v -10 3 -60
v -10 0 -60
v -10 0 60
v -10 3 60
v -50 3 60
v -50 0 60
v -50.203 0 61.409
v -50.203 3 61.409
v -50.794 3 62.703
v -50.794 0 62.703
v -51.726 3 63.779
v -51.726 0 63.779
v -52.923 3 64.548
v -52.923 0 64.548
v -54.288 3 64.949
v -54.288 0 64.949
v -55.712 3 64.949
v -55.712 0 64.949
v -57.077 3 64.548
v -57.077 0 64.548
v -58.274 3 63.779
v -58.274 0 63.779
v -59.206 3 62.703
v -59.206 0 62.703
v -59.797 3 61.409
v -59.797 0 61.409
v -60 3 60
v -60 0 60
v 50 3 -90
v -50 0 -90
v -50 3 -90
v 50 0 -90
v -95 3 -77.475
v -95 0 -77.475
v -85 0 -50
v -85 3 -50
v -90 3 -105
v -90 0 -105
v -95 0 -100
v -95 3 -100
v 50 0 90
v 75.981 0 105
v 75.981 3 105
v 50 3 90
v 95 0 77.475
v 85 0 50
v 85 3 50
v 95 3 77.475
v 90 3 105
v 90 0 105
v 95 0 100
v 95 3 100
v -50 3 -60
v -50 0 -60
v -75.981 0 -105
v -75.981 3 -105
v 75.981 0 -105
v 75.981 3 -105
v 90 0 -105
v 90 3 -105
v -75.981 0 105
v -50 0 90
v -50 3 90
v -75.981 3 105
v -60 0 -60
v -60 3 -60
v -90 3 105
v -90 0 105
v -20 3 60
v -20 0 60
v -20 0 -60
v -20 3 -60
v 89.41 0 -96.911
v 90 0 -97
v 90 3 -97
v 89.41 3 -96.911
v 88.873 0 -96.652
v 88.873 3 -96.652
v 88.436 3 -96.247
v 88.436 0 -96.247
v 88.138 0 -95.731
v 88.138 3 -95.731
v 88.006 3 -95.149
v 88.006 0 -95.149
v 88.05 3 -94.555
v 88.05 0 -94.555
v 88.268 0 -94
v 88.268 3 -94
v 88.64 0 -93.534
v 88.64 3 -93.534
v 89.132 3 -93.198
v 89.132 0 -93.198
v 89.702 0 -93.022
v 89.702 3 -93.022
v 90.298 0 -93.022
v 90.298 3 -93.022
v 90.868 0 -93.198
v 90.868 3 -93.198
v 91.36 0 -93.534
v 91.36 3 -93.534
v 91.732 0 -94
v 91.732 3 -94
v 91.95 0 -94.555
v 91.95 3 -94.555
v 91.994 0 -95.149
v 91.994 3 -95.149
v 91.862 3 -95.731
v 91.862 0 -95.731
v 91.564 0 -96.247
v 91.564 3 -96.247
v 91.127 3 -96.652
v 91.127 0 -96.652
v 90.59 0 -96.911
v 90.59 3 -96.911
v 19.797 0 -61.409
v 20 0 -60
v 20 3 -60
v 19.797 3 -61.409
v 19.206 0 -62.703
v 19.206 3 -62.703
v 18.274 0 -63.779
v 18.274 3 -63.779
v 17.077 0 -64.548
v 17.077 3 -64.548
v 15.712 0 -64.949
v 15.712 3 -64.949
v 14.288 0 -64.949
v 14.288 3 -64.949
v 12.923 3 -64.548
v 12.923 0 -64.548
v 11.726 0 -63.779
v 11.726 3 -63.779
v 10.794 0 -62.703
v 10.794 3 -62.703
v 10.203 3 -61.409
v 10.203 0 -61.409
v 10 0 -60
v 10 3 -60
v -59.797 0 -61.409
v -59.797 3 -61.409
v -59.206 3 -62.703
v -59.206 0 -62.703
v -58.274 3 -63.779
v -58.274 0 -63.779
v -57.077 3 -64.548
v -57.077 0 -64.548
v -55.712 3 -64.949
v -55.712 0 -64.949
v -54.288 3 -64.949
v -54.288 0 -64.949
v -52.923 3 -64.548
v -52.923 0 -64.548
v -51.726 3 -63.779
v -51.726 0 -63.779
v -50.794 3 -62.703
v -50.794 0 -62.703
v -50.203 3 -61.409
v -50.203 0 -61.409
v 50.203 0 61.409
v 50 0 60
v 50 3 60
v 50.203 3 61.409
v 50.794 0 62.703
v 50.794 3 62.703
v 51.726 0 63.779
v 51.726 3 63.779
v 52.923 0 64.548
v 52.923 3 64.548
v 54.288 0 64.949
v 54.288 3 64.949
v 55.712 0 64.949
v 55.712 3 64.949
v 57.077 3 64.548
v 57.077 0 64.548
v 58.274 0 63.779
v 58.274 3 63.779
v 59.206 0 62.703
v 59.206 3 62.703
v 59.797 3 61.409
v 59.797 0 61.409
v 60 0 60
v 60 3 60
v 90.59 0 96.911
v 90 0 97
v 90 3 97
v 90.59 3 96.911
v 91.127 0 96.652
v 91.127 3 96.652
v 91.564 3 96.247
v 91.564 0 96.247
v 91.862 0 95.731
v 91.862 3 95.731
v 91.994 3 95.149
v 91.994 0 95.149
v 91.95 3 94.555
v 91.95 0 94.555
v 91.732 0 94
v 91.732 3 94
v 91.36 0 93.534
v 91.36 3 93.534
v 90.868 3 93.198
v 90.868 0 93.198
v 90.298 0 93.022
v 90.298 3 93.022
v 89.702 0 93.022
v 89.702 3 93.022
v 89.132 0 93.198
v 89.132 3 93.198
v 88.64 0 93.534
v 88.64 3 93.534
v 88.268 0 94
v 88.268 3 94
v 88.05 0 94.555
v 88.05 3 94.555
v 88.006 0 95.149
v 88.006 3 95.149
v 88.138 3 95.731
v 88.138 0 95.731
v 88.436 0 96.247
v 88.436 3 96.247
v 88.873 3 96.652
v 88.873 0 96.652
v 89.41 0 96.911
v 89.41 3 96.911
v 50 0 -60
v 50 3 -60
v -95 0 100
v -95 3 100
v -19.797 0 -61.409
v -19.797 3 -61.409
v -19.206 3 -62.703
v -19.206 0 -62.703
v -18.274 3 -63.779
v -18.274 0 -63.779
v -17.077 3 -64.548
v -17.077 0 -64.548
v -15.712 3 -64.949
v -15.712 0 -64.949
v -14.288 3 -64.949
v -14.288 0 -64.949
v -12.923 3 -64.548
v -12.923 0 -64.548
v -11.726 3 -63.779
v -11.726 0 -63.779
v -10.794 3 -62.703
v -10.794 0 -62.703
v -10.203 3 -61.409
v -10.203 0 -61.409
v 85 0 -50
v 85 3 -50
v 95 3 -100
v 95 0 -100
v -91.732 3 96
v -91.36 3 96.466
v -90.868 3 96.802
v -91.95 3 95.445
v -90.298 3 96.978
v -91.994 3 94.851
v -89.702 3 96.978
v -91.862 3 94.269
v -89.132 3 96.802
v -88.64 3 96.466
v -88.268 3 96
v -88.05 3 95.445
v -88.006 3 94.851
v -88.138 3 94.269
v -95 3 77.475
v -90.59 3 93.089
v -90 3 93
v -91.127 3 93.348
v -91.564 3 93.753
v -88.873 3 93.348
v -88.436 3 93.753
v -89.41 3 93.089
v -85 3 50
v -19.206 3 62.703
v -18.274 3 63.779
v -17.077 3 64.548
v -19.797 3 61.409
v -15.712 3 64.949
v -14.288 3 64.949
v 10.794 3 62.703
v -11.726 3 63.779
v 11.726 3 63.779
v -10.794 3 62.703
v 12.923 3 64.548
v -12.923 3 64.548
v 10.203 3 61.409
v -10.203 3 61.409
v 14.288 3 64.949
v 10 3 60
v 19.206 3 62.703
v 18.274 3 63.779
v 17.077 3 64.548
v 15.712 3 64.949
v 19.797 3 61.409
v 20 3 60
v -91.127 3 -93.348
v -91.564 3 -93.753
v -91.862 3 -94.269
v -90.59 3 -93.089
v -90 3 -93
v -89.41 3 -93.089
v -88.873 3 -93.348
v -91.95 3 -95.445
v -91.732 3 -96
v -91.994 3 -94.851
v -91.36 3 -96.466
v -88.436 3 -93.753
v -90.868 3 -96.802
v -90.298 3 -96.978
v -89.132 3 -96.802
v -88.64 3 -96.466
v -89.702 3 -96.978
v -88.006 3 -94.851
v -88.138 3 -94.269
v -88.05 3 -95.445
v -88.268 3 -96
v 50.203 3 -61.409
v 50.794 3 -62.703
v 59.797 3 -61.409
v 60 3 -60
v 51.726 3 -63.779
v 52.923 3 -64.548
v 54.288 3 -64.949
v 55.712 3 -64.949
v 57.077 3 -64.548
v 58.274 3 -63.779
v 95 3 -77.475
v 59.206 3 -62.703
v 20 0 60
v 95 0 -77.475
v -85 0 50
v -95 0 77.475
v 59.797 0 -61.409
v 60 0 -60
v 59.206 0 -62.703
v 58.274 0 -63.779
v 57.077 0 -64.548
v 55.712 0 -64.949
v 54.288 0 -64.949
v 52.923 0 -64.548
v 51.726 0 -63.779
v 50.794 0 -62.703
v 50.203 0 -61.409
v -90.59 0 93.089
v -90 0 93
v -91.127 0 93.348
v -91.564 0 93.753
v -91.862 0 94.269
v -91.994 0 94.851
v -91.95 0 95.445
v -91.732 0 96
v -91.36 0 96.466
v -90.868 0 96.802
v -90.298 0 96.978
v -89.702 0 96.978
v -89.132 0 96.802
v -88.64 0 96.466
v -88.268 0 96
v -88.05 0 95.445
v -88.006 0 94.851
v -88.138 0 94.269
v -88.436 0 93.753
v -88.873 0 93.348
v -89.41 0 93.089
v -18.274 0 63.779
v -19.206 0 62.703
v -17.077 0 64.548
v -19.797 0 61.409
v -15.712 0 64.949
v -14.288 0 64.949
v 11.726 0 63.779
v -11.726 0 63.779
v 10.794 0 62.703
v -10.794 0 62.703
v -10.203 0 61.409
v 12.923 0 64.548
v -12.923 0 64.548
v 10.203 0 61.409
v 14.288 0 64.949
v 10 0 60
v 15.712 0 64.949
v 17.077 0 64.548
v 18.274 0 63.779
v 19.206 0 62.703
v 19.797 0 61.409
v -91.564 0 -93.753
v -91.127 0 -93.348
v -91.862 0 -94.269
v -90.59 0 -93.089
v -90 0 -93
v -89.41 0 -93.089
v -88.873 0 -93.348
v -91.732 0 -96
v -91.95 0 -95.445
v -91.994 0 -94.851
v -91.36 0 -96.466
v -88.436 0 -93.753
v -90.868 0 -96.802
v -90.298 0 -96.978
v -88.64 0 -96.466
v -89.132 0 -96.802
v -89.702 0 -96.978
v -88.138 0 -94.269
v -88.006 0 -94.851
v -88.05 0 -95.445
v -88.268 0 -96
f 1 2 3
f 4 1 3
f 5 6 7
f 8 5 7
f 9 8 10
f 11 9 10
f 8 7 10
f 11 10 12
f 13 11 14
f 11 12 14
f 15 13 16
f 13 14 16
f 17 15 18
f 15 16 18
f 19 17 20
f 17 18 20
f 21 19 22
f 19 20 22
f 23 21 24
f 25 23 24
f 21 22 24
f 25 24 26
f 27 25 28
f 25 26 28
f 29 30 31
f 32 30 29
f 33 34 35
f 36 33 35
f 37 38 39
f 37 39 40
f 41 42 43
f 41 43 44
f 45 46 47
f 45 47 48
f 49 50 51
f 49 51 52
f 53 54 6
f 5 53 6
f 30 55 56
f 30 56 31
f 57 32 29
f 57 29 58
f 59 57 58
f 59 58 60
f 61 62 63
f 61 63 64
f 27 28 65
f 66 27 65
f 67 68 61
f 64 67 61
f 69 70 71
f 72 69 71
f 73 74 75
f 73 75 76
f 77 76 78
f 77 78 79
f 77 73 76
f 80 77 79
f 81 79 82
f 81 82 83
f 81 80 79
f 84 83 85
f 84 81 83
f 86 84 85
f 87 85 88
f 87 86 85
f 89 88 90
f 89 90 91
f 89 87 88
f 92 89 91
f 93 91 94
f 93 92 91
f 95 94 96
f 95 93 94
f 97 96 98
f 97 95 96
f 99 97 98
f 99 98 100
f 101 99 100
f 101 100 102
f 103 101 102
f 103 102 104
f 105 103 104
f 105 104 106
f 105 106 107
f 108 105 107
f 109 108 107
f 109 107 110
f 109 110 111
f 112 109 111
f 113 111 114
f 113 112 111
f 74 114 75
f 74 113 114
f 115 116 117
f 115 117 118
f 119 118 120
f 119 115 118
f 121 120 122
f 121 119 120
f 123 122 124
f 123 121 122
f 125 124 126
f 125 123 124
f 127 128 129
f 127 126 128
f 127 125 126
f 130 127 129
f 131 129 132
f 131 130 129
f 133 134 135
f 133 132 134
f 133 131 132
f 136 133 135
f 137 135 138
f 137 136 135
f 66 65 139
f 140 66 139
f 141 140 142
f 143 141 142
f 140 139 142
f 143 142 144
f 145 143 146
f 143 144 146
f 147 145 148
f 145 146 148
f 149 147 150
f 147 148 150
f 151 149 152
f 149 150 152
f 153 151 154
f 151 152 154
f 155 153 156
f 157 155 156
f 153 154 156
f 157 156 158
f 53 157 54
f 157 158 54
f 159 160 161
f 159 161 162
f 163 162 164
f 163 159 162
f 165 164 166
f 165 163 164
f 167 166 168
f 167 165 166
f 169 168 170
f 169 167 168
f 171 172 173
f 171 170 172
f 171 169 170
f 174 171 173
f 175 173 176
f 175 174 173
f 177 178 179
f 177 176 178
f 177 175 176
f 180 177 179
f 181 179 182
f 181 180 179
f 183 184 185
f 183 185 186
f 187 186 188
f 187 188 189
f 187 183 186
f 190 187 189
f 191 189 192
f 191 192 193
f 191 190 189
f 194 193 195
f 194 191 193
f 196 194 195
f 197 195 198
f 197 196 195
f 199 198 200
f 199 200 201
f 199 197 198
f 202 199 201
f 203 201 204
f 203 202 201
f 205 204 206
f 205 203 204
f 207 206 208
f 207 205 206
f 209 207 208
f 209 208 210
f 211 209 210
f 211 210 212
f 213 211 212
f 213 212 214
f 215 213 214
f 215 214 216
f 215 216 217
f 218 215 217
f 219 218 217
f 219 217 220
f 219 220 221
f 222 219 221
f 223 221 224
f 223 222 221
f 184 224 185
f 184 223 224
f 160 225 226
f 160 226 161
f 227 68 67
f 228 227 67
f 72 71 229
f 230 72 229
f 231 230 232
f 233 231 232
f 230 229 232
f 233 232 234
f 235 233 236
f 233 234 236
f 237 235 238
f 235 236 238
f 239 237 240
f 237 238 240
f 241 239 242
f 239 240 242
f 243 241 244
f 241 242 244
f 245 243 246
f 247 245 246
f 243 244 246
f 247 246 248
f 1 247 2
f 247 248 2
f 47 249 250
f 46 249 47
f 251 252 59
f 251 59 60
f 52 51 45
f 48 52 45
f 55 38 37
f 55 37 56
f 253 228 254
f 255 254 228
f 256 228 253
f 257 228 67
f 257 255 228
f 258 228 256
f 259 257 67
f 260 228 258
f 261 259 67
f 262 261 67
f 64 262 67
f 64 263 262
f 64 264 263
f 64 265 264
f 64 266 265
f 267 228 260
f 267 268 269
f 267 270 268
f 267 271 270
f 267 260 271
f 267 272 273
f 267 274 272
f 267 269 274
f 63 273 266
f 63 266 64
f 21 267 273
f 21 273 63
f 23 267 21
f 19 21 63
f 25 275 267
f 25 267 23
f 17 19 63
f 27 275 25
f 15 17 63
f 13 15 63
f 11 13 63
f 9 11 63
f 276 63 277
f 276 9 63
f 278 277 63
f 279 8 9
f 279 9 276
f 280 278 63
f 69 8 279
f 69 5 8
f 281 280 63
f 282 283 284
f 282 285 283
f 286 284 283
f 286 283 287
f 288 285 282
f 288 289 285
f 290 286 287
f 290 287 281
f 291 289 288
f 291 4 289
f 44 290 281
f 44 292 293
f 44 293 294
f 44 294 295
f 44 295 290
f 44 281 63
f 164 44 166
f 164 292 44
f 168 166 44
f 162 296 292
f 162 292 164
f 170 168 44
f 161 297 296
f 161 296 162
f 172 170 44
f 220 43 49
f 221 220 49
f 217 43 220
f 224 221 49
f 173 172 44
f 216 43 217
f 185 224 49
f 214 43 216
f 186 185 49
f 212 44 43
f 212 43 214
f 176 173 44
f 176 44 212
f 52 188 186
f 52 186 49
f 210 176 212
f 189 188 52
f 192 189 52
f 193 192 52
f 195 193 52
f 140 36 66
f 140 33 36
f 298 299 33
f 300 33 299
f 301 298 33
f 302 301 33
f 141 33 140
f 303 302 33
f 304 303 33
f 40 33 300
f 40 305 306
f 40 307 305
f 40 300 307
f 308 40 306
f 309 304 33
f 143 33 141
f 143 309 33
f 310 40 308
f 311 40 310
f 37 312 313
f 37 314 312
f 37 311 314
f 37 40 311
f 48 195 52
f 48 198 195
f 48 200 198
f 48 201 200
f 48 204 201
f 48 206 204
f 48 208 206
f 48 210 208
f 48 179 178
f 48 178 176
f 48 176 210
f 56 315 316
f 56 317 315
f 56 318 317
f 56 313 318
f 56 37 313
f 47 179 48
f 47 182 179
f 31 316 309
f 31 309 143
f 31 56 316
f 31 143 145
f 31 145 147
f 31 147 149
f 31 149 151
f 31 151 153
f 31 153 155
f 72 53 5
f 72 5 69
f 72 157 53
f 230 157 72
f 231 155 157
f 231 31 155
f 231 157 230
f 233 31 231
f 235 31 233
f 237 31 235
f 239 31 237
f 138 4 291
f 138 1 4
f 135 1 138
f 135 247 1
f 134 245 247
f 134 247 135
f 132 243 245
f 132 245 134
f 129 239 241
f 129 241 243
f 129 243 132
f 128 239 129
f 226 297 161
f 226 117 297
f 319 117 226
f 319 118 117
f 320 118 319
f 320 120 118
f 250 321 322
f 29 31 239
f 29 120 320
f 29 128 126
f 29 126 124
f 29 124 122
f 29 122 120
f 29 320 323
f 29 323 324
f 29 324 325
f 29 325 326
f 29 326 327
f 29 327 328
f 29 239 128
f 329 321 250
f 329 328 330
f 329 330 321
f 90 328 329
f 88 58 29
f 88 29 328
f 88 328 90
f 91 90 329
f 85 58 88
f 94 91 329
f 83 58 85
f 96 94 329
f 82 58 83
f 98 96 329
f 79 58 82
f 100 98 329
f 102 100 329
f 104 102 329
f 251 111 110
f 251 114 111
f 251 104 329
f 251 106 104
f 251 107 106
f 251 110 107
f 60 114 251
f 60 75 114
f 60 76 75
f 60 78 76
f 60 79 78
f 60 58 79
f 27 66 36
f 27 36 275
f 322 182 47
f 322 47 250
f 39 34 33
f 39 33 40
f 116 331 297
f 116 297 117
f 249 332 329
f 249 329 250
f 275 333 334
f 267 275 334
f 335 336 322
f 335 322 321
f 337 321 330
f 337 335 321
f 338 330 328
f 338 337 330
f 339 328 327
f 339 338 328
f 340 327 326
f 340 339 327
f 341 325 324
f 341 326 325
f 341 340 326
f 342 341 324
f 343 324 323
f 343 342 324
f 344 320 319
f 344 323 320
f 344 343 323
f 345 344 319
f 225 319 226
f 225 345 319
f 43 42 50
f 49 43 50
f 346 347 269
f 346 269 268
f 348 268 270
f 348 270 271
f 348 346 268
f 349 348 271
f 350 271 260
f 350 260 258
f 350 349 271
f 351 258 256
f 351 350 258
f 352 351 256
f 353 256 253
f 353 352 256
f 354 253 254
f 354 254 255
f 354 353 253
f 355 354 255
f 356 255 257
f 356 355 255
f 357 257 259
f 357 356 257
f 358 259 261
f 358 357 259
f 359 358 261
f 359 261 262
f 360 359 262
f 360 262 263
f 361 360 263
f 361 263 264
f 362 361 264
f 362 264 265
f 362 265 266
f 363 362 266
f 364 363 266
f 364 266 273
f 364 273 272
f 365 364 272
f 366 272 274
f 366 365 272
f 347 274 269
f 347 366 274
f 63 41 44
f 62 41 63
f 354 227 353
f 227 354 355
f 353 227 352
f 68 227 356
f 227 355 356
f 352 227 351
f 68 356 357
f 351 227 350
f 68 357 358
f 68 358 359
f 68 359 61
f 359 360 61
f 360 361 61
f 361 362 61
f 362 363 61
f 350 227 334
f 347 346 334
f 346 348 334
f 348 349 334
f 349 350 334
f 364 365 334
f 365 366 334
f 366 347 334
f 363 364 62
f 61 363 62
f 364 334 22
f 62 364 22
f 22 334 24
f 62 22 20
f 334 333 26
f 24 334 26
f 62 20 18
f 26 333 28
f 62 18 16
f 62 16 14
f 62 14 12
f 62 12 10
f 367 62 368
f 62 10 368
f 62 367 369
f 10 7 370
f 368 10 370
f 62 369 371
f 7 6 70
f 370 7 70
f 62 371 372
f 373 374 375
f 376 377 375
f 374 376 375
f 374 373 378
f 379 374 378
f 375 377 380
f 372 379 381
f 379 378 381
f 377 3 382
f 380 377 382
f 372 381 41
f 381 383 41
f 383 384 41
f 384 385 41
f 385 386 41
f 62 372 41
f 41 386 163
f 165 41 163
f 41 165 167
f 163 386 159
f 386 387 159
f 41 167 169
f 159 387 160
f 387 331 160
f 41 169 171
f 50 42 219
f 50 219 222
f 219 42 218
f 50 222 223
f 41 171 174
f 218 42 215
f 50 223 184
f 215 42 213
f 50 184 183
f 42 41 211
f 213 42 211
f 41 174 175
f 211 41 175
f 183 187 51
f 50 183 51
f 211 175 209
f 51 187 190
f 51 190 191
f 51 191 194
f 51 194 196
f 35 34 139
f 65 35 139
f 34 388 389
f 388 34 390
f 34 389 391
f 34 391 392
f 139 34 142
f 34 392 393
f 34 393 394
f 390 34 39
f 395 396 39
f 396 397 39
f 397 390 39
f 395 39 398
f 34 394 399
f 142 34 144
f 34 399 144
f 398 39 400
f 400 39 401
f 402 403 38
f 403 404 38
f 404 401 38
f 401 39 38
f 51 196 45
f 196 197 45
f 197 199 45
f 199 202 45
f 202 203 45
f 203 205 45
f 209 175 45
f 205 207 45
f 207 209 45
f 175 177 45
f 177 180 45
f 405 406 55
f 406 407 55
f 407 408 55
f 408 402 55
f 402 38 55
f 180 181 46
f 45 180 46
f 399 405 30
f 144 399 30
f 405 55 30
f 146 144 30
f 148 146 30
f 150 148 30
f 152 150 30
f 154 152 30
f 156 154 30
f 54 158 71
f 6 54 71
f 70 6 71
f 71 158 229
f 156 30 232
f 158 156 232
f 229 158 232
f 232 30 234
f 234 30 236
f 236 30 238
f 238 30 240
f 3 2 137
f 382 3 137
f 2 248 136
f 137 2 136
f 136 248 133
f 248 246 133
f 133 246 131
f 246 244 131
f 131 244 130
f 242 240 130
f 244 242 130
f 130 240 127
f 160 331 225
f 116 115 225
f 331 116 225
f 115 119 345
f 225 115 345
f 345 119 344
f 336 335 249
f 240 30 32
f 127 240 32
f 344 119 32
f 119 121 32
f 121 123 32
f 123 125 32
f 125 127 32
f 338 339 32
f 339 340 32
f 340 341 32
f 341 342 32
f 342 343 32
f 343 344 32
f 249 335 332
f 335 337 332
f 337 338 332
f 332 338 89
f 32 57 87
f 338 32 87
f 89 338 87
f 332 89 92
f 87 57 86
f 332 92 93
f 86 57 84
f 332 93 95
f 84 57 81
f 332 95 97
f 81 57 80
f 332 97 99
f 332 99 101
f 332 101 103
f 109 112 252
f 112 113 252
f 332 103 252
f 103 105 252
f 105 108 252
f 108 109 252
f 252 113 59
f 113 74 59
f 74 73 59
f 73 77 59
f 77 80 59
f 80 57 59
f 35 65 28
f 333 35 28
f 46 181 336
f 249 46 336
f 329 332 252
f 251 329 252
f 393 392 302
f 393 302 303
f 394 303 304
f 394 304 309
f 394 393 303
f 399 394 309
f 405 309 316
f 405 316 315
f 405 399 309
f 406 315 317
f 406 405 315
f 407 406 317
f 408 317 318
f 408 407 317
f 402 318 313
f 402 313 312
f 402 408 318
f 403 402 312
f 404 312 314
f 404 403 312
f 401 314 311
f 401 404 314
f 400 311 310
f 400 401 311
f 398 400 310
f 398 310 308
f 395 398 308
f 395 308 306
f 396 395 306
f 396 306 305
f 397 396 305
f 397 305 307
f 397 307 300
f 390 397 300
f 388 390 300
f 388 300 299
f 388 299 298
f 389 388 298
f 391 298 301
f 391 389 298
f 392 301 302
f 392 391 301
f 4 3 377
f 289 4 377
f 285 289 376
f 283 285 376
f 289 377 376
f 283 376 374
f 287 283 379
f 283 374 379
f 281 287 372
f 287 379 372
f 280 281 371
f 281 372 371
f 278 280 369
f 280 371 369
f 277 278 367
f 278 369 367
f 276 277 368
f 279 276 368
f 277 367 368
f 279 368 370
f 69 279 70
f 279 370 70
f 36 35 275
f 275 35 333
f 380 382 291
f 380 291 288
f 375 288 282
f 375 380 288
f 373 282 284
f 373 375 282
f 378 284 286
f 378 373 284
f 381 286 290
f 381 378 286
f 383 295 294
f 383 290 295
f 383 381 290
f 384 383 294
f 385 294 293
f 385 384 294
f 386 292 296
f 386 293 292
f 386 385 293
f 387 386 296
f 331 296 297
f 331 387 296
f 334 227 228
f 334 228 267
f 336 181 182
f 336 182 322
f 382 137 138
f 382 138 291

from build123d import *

# Parameters (mm, degrees)
SKETCH_2_W          = 190
SKETCH_2_H          = 210
SKETCH_2_R          = 2
EXTRUDE_1_DEPTH     = 3
CUT_EXTRUDE_1_DEPTH = 142.629799124
CHAMFER_1_SIZE      = 5


with BuildPart() as part:
    # 草图2 → 凸台-拉伸1 (new body)
    with BuildSketch(Plane(origin=(0, 0, 0), x_dir=(1, 0, 0), z_dir=(0, 1, 0))):
        Rectangle(SKETCH_2_W, SKETCH_2_H)
        with Locations(Location((-90, 95, 0), (0, 0, 270))):
            Circle(SKETCH_2_R, mode=Mode.SUBTRACT)
        with Locations(Location((90, 95, 0), (0, 0, 90))):
            Circle(SKETCH_2_R, mode=Mode.SUBTRACT)
        with Locations(Location((90, -95, 0), (0, 0, 270))):
            Circle(SKETCH_2_R, mode=Mode.SUBTRACT)
        with Locations(Location((-90, -95, 0), (0, 0, 90))):
            Circle(SKETCH_2_R, mode=Mode.SUBTRACT)
    extrude(amount=EXTRUDE_1_DEPTH)

    # 草图3 → 切除-拉伸1 (cut, through all)
    with BuildSketch(Plane(origin=(0, 0, 0), x_dir=(1, 0, 0), z_dir=(0, 1, 0))):
        Polygon((-75.980762114, 105), (-50, 90), (50, 90), (75.980762114, 105), align=None)
        Polygon((-95, 77.474774195), (-85, 50), (-85, -50), (-95, -77.474774195), align=None)
        with BuildLine():
            Line((-50, 60), (-50, -60))
            ThreePointArc((-50, -60), (-55, -65), (-60, -60))
            Line((-60, -60), (-60, 60))
            ThreePointArc((-60, 60), (-55, 65), (-50, 60))
        make_face()
        with BuildLine():
            Line((-10, 60), (-10, -60))
            ThreePointArc((-10, -60), (-15, -65), (-20, -60))
            Line((-20, -60), (-20, 60))
            ThreePointArc((-20, 60), (-15, 65), (-10, 60))
        make_face()
        with BuildLine():
            Line((10, 60), (10, -60))
            ThreePointArc((10, -60), (15, -65), (20, -60))
            Line((20, -60), (20, 60))
            ThreePointArc((20, 60), (15, 65), (10, 60))
        make_face()
        with BuildLine():
            Line((50, 60), (50, -60))
            ThreePointArc((50, -60), (55, -65), (60, -60))
            Line((60, -60), (60, 60))
            ThreePointArc((60, 60), (55, 65), (50, 60))
        make_face()
        Polygon((85, 50), (85, -50), (95, -77.474774195), (95, 77.474774195), align=None)
        Polygon((75.980762114, -105), (50, -90), (-50, -90), (-75.980762114, -105), align=None)
    extrude(amount=CUT_EXTRUDE_1_DEPTH, mode=Mode.SUBTRACT)

    # 倒角1
    chamfer_1_edges = [part.edges().sort_by_distance(p)[0] for p in [
        (-95, 1.5, -105),
        (95, 1.5, -105),
        (95, 1.5, 105),
        (-95, 1.5, 105),
    ]]
    chamfer(chamfer_1_edges, length=CHAMFER_1_SIZE)


solid = part.part
